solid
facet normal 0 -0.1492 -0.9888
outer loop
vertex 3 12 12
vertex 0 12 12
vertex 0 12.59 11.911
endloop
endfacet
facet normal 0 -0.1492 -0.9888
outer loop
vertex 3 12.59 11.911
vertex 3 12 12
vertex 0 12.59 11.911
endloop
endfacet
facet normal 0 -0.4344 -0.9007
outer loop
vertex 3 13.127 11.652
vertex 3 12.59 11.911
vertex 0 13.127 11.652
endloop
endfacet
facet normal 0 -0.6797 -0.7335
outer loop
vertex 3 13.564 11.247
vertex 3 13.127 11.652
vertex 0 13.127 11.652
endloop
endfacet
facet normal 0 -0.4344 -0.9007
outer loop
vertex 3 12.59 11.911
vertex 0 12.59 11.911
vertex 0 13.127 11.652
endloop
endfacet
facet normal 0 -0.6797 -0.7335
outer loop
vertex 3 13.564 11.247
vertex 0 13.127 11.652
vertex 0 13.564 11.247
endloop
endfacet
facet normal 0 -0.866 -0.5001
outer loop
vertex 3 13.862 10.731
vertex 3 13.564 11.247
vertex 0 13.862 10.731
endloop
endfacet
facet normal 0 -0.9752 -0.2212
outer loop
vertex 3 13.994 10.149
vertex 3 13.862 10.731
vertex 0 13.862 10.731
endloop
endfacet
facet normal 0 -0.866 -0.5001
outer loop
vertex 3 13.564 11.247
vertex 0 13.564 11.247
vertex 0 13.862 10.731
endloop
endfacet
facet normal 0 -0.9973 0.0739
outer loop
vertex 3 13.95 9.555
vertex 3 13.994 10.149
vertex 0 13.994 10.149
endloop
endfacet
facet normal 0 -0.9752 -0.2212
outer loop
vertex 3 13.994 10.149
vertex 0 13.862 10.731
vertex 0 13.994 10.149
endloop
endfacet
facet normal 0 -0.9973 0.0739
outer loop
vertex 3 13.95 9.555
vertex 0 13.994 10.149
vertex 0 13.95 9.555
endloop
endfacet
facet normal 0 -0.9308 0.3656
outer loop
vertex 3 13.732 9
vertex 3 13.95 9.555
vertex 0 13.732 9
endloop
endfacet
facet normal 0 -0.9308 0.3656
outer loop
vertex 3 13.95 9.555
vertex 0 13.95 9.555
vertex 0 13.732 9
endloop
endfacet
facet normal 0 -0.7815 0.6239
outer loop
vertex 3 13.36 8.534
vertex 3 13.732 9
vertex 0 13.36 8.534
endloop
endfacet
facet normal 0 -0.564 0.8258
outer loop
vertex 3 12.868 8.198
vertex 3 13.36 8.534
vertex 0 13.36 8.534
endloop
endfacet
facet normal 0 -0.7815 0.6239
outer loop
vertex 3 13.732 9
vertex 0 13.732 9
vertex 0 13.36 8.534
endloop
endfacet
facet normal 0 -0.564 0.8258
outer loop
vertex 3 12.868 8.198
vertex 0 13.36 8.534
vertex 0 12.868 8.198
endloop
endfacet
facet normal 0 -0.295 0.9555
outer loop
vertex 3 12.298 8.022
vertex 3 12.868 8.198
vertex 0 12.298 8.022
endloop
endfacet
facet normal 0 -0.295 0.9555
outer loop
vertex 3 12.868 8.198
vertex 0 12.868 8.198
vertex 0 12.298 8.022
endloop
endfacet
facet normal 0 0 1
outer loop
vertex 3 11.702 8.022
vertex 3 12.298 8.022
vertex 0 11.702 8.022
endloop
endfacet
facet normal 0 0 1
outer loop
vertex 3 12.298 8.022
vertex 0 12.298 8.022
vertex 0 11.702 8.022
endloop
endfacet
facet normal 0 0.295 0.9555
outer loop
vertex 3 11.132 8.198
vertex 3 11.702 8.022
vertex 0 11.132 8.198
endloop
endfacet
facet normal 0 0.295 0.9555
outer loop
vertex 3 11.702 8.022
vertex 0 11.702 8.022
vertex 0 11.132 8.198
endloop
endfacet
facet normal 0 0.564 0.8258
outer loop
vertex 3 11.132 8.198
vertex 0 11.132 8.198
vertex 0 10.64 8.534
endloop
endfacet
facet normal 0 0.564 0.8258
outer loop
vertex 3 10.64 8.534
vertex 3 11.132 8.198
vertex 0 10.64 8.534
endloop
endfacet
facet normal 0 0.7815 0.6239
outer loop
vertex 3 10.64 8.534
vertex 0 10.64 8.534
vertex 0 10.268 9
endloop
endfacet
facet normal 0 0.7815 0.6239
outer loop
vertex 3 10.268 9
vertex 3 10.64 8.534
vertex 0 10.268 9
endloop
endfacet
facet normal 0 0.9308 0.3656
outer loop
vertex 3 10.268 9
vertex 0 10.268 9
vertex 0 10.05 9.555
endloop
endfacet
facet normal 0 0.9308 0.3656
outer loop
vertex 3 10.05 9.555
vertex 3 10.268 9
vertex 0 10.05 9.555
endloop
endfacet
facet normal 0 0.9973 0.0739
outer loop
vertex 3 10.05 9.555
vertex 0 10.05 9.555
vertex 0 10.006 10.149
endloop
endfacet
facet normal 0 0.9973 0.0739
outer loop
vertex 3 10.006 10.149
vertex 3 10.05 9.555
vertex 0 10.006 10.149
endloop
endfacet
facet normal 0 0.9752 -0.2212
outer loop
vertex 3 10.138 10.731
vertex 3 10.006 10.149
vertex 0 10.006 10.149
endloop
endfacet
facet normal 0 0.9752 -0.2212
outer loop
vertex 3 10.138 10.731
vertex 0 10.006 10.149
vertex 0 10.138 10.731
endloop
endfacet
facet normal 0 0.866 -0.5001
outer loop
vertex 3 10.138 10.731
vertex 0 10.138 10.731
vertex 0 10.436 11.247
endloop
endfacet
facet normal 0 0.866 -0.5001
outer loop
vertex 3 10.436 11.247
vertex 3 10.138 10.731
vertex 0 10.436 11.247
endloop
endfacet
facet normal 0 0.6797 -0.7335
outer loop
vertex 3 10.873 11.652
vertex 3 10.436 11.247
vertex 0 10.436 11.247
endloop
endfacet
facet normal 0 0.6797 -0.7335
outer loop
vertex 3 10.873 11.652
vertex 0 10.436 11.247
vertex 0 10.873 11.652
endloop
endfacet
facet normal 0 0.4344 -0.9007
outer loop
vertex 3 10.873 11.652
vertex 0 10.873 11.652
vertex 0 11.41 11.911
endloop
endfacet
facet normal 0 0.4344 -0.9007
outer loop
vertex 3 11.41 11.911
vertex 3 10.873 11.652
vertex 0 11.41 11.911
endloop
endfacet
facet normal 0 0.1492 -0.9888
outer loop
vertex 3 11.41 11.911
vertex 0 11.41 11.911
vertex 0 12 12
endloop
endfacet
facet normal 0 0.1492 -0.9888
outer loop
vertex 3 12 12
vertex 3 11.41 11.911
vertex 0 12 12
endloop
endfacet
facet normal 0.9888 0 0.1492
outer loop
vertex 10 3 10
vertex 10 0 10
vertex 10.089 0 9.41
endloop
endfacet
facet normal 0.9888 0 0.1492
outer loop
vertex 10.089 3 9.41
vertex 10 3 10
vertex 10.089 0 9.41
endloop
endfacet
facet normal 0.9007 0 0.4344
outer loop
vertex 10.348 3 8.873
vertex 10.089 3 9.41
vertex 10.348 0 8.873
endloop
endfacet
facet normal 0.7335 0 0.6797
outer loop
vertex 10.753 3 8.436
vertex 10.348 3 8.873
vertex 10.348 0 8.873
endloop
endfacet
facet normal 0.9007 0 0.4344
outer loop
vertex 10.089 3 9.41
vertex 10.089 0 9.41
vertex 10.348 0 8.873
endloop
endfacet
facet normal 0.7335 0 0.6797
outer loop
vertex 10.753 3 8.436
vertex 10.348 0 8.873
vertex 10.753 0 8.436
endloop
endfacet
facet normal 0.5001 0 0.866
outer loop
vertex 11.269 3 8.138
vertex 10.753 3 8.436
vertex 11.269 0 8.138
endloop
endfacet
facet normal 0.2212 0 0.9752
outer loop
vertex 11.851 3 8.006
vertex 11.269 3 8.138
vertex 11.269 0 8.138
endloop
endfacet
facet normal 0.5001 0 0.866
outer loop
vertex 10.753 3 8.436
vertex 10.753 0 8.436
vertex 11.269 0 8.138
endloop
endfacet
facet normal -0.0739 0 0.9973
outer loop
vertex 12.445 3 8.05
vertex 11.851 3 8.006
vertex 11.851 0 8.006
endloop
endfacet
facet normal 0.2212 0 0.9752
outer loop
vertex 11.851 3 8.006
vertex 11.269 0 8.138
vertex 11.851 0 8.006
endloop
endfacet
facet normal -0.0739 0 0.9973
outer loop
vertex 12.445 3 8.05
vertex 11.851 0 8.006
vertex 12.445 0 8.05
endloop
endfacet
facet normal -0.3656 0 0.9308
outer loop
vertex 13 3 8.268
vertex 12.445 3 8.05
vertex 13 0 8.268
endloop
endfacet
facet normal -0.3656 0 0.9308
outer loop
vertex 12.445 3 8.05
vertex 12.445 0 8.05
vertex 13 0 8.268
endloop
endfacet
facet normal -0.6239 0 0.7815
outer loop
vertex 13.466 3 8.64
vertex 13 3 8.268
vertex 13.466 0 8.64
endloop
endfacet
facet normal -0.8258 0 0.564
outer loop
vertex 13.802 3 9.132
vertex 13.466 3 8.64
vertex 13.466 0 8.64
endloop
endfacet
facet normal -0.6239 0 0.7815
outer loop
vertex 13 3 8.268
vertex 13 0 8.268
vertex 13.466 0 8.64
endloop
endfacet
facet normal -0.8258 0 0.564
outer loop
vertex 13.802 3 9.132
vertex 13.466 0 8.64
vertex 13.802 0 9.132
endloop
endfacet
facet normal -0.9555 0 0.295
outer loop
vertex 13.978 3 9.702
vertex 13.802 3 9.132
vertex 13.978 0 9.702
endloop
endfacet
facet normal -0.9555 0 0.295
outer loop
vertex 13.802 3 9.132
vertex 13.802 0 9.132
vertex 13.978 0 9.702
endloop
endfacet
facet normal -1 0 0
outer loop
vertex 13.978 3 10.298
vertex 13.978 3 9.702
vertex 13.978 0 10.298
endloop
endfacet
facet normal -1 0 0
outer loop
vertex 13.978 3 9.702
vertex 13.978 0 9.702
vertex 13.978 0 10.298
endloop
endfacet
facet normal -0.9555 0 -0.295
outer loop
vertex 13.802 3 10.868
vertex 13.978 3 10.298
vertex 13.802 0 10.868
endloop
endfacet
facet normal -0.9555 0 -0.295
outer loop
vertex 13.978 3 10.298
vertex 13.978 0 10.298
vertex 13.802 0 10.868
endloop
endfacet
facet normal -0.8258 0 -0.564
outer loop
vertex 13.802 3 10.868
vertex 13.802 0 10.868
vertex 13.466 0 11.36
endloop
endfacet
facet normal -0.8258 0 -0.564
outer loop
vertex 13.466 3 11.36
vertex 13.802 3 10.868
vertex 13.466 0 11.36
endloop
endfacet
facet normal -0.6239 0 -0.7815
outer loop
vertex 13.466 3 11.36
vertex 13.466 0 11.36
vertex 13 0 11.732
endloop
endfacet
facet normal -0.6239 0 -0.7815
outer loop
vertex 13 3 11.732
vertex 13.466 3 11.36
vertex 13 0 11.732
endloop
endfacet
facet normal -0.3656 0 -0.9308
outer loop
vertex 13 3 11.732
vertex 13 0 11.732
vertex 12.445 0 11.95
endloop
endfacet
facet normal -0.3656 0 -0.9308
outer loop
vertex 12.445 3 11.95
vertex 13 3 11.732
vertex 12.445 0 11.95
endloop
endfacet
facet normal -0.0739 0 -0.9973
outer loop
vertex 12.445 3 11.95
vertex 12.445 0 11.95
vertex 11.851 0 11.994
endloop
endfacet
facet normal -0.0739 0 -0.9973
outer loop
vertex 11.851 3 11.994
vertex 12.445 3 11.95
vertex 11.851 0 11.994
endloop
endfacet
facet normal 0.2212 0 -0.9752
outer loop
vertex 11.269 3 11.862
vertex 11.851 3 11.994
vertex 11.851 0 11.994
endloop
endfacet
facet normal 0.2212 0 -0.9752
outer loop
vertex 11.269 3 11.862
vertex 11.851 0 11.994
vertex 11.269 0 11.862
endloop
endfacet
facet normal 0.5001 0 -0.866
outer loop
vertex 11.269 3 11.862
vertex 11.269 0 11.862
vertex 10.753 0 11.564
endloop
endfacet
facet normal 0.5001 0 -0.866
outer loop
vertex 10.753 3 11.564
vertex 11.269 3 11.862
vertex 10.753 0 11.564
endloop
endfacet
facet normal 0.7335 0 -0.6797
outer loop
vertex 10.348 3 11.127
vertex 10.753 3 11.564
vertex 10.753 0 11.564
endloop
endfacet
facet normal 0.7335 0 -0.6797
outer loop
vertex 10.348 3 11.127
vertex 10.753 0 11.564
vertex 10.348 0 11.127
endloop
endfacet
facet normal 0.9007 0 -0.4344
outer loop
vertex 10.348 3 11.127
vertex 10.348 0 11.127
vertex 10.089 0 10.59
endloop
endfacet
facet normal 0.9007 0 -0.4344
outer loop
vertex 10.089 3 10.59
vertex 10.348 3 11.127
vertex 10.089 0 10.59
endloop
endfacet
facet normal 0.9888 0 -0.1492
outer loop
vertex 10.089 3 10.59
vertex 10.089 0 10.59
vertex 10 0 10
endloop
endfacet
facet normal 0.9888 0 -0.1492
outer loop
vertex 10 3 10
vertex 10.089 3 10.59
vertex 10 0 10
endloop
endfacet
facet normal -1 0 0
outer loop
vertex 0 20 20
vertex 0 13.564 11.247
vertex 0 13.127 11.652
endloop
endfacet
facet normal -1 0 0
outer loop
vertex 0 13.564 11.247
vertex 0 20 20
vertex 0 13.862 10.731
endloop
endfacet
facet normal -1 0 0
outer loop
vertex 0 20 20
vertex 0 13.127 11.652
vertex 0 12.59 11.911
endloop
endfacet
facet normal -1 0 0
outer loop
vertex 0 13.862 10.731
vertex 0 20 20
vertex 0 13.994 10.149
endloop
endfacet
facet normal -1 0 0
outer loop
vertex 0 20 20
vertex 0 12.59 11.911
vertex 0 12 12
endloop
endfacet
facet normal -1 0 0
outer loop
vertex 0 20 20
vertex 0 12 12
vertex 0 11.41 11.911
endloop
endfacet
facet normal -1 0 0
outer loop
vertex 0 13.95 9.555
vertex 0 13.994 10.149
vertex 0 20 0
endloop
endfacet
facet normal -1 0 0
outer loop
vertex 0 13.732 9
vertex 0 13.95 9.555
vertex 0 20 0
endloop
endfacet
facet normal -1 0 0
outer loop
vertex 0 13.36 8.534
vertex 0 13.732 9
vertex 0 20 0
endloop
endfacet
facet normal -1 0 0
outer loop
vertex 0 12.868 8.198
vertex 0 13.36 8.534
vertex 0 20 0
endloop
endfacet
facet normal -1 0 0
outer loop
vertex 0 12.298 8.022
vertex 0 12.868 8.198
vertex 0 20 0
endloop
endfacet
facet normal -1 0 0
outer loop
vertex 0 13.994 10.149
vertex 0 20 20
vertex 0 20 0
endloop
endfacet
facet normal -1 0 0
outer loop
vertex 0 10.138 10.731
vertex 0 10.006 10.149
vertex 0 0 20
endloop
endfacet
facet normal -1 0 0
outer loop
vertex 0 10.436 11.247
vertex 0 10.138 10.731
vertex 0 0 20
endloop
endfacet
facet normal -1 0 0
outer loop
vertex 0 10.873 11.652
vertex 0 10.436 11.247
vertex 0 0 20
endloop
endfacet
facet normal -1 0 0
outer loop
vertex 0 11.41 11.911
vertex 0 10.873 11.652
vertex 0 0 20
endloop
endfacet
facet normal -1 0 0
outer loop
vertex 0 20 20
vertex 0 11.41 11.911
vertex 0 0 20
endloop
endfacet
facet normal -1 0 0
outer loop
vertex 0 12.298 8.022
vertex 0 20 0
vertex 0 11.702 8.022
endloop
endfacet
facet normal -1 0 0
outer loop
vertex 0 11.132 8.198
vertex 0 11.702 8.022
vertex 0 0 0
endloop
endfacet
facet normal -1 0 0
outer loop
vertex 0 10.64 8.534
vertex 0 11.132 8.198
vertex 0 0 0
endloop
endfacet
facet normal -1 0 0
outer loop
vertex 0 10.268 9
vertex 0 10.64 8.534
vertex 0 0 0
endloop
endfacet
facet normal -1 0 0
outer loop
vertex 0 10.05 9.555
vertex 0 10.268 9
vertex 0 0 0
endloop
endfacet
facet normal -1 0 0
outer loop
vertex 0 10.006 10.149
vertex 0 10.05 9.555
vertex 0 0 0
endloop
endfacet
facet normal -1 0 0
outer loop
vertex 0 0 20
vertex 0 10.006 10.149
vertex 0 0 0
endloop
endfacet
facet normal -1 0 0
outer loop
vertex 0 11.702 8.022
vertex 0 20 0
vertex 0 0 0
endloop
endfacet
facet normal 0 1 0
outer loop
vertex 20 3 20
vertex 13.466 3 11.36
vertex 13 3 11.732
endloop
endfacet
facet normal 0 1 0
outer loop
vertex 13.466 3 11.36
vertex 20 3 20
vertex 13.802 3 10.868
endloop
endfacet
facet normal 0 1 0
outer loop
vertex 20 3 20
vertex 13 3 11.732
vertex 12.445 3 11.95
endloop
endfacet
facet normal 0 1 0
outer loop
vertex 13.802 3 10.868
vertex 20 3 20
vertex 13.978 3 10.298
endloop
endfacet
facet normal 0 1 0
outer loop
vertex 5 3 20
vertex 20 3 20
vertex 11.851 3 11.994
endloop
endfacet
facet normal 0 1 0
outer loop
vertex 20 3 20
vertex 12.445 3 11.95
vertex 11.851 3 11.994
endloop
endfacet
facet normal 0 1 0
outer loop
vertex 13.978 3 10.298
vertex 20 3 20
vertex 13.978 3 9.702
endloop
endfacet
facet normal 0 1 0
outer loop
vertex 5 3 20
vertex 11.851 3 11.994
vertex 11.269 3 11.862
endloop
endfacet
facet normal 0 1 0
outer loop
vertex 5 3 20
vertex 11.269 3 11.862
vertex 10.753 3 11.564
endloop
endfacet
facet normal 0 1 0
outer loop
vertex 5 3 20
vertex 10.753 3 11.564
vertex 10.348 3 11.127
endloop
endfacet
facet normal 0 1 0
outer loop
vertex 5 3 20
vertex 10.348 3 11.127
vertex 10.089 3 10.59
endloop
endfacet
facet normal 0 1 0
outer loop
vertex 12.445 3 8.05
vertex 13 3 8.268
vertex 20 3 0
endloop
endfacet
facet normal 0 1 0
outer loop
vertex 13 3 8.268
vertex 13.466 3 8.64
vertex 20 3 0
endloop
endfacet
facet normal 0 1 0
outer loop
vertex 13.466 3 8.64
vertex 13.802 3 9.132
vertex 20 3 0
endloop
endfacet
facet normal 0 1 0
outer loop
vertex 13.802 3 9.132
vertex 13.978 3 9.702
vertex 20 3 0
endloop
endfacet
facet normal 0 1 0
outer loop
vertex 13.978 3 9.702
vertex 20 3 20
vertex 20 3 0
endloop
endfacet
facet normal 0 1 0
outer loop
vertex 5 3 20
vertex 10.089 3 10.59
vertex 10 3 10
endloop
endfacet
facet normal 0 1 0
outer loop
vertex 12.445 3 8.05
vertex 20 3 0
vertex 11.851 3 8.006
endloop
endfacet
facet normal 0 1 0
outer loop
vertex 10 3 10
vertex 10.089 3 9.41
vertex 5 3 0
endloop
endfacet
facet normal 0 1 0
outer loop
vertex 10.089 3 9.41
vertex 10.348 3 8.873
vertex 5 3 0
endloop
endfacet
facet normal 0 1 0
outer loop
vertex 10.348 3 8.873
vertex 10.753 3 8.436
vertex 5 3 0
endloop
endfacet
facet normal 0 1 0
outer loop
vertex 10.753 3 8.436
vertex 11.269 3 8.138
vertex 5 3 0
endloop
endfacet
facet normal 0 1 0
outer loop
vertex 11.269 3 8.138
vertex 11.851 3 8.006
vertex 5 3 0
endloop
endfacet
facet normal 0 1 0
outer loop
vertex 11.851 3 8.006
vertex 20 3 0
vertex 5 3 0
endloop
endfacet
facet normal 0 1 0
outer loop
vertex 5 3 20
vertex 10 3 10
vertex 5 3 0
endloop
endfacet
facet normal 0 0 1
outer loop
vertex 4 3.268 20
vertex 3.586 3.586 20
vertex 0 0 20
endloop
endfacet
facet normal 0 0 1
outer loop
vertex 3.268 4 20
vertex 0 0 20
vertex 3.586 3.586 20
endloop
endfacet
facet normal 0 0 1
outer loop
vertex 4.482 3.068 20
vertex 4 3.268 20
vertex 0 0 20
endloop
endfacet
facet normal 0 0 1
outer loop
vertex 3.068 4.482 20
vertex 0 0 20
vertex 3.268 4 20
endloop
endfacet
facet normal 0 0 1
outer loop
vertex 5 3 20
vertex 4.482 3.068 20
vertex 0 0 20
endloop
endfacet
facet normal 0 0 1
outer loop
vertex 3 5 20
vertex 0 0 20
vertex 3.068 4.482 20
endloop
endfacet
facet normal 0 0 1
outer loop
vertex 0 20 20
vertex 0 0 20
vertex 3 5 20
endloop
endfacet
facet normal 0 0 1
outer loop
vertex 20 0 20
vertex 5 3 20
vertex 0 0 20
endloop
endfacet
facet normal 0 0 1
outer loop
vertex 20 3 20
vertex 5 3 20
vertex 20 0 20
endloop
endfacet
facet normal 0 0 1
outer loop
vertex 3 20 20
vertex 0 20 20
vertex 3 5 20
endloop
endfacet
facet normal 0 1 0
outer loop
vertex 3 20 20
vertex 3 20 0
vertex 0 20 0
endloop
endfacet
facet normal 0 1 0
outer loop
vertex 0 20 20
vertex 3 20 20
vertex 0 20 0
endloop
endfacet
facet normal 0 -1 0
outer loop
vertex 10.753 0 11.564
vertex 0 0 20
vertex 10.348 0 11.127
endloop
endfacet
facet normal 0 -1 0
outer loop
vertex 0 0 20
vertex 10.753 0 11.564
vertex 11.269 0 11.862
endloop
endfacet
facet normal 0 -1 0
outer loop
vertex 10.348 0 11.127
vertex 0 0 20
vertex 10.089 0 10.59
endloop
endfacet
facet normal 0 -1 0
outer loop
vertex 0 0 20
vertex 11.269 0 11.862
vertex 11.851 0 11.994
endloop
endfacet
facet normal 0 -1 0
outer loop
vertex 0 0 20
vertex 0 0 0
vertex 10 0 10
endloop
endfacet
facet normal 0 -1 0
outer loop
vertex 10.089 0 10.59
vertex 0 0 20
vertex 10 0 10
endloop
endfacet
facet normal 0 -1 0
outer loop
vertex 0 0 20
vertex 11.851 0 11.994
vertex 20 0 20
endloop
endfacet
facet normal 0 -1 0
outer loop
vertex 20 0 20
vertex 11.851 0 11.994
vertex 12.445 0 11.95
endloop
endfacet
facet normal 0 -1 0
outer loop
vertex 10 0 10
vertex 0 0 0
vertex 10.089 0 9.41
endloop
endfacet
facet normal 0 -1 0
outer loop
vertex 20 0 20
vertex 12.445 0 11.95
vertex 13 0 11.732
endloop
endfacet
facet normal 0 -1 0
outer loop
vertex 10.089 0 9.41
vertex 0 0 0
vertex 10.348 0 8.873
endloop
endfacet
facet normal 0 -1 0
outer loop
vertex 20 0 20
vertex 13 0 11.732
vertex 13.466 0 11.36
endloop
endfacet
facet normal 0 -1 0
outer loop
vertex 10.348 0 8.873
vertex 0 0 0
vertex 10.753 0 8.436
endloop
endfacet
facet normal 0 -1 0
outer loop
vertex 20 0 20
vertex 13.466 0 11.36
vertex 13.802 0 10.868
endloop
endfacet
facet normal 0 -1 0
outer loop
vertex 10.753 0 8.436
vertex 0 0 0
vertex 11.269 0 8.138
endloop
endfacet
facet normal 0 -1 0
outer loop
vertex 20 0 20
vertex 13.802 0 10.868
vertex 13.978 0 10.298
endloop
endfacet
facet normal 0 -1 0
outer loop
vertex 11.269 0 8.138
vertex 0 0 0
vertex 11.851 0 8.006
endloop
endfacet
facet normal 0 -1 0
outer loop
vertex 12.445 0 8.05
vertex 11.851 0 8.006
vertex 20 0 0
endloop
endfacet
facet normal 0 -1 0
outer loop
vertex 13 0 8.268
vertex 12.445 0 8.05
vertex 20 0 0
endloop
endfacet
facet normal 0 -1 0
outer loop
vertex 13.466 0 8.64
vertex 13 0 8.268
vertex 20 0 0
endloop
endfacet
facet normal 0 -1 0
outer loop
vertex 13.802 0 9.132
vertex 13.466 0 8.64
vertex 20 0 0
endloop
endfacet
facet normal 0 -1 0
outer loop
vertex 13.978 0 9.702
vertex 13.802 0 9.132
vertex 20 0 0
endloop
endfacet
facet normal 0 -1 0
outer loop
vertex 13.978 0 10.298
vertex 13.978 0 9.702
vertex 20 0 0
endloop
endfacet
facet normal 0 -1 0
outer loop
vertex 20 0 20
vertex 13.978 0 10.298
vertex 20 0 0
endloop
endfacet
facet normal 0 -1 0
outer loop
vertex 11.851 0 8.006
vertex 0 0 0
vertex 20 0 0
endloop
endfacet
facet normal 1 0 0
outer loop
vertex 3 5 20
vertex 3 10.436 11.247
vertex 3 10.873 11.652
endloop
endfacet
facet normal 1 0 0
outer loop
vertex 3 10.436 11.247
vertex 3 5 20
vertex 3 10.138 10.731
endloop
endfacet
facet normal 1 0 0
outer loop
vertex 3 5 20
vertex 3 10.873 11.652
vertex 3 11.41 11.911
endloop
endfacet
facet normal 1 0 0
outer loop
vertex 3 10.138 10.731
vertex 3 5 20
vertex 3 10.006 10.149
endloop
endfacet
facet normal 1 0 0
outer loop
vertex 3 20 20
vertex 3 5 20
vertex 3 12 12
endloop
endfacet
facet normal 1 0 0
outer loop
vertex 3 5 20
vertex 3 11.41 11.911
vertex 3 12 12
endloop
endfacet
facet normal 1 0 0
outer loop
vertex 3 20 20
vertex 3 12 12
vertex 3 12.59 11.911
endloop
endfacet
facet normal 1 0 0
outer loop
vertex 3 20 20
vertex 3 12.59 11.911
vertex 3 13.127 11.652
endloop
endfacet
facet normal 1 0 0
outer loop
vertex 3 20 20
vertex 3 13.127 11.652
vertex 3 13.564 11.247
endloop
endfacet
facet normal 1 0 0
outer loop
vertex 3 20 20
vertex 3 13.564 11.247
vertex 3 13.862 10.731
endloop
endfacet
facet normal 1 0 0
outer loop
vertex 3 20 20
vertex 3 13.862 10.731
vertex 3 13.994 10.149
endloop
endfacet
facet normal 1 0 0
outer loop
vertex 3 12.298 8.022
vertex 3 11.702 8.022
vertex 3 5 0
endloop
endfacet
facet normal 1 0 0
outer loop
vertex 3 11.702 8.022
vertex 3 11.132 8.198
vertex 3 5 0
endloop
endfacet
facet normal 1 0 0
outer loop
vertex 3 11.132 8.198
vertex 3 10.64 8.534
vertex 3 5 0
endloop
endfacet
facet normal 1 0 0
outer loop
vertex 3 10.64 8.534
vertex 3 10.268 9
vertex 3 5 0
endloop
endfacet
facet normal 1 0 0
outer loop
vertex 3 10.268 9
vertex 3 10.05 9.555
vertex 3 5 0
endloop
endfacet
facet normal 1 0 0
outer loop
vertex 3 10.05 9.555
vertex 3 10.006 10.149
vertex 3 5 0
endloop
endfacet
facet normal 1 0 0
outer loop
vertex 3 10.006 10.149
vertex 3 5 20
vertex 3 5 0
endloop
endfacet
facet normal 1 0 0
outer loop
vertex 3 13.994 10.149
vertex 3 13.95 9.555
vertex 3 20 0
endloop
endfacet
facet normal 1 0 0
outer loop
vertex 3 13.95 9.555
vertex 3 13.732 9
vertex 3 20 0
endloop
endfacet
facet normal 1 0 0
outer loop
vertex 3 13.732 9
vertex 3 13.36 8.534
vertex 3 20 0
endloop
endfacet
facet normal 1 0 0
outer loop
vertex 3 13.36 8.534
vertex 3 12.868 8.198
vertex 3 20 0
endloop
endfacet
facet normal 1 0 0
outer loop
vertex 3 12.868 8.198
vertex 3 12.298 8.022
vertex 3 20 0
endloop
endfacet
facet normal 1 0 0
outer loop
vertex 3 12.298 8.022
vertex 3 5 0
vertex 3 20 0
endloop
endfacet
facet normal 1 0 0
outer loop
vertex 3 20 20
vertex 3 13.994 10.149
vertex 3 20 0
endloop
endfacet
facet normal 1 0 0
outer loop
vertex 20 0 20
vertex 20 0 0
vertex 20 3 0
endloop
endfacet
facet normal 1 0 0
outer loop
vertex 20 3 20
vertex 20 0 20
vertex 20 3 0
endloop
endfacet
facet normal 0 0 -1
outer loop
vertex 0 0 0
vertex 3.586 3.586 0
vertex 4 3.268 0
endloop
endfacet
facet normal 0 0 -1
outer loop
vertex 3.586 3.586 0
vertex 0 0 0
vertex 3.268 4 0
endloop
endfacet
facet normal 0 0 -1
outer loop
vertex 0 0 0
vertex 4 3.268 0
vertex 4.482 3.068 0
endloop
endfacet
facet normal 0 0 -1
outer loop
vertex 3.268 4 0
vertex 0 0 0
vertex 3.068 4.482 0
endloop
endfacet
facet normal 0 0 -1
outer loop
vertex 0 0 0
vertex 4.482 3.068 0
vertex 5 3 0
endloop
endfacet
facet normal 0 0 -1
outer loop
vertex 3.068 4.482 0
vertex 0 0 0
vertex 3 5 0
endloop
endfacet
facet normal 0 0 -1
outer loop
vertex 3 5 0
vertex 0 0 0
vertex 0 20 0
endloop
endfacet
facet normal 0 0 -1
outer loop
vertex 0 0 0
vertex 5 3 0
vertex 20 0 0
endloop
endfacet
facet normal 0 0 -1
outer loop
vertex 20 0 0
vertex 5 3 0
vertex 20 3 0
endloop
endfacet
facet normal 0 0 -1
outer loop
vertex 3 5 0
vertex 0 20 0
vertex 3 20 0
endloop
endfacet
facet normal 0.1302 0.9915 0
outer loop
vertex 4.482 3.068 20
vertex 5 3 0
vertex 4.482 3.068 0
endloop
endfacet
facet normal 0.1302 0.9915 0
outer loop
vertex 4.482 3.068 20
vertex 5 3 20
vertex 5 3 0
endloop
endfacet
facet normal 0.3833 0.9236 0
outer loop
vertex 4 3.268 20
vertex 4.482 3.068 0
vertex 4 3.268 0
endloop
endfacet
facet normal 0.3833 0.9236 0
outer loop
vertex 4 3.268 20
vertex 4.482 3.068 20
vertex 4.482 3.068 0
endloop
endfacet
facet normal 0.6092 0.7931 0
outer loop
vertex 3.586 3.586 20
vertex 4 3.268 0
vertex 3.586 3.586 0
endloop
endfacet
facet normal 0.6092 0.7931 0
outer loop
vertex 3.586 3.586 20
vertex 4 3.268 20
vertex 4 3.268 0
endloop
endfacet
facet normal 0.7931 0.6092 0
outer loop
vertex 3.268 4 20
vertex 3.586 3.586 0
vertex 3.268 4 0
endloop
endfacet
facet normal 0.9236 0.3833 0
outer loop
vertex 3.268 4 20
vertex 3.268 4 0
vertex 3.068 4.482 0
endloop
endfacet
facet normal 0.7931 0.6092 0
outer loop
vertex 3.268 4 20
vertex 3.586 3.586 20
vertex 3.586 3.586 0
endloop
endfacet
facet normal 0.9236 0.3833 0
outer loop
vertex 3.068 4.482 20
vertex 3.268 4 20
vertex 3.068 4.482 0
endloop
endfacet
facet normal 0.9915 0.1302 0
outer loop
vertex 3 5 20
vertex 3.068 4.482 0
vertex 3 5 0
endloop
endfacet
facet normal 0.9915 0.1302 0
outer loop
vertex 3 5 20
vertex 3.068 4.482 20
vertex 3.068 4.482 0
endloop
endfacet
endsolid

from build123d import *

# Parameters (mm, degrees)
BOSS_EXTRUDE1_DEPTH   = 20
FILLET1_R             = 2
F_4_0MM_DOWEL_HOLE1_D = 4
F_4_0MM_DOWEL_HOLE2_D = 4


with BuildPart() as part:
    # Sketch1 → Boss-Extrude1 (new body)
    with BuildSketch(Plane.XY):
        Polygon((20, 3), (3, 3), (3, 20), (0, 20), (0, 3), (0, 0), (3, 0), (20, 0), align=None)
    extrude(amount=BOSS_EXTRUDE1_DEPTH)

    # Fillet1
    fillet1_edges = [part.edges().sort_by_distance(p)[0] for p in [
        (3, 3, 10),
    ]]
    fillet(fillet1_edges, radius=FILLET1_R)

    # Ø4.0mm Dowel Hole1 (through all)
    with Locations(Plane(origin=(3, 0, 0), x_dir=(0, 0, -1), z_dir=(1, 0, 0))):
        with Locations((-10, 12)):
            Hole(F_4_0MM_DOWEL_HOLE1_D / 2)

    # Ø4.0mm Dowel Hole2 (through all)
    with Locations(Plane(origin=(0, 3, 0), x_dir=(1, 0, 0), z_dir=(0, 1, 0))):
        with Locations((12, -10)):
            Hole(F_4_0MM_DOWEL_HOLE2_D / 2)


solid = part.part
